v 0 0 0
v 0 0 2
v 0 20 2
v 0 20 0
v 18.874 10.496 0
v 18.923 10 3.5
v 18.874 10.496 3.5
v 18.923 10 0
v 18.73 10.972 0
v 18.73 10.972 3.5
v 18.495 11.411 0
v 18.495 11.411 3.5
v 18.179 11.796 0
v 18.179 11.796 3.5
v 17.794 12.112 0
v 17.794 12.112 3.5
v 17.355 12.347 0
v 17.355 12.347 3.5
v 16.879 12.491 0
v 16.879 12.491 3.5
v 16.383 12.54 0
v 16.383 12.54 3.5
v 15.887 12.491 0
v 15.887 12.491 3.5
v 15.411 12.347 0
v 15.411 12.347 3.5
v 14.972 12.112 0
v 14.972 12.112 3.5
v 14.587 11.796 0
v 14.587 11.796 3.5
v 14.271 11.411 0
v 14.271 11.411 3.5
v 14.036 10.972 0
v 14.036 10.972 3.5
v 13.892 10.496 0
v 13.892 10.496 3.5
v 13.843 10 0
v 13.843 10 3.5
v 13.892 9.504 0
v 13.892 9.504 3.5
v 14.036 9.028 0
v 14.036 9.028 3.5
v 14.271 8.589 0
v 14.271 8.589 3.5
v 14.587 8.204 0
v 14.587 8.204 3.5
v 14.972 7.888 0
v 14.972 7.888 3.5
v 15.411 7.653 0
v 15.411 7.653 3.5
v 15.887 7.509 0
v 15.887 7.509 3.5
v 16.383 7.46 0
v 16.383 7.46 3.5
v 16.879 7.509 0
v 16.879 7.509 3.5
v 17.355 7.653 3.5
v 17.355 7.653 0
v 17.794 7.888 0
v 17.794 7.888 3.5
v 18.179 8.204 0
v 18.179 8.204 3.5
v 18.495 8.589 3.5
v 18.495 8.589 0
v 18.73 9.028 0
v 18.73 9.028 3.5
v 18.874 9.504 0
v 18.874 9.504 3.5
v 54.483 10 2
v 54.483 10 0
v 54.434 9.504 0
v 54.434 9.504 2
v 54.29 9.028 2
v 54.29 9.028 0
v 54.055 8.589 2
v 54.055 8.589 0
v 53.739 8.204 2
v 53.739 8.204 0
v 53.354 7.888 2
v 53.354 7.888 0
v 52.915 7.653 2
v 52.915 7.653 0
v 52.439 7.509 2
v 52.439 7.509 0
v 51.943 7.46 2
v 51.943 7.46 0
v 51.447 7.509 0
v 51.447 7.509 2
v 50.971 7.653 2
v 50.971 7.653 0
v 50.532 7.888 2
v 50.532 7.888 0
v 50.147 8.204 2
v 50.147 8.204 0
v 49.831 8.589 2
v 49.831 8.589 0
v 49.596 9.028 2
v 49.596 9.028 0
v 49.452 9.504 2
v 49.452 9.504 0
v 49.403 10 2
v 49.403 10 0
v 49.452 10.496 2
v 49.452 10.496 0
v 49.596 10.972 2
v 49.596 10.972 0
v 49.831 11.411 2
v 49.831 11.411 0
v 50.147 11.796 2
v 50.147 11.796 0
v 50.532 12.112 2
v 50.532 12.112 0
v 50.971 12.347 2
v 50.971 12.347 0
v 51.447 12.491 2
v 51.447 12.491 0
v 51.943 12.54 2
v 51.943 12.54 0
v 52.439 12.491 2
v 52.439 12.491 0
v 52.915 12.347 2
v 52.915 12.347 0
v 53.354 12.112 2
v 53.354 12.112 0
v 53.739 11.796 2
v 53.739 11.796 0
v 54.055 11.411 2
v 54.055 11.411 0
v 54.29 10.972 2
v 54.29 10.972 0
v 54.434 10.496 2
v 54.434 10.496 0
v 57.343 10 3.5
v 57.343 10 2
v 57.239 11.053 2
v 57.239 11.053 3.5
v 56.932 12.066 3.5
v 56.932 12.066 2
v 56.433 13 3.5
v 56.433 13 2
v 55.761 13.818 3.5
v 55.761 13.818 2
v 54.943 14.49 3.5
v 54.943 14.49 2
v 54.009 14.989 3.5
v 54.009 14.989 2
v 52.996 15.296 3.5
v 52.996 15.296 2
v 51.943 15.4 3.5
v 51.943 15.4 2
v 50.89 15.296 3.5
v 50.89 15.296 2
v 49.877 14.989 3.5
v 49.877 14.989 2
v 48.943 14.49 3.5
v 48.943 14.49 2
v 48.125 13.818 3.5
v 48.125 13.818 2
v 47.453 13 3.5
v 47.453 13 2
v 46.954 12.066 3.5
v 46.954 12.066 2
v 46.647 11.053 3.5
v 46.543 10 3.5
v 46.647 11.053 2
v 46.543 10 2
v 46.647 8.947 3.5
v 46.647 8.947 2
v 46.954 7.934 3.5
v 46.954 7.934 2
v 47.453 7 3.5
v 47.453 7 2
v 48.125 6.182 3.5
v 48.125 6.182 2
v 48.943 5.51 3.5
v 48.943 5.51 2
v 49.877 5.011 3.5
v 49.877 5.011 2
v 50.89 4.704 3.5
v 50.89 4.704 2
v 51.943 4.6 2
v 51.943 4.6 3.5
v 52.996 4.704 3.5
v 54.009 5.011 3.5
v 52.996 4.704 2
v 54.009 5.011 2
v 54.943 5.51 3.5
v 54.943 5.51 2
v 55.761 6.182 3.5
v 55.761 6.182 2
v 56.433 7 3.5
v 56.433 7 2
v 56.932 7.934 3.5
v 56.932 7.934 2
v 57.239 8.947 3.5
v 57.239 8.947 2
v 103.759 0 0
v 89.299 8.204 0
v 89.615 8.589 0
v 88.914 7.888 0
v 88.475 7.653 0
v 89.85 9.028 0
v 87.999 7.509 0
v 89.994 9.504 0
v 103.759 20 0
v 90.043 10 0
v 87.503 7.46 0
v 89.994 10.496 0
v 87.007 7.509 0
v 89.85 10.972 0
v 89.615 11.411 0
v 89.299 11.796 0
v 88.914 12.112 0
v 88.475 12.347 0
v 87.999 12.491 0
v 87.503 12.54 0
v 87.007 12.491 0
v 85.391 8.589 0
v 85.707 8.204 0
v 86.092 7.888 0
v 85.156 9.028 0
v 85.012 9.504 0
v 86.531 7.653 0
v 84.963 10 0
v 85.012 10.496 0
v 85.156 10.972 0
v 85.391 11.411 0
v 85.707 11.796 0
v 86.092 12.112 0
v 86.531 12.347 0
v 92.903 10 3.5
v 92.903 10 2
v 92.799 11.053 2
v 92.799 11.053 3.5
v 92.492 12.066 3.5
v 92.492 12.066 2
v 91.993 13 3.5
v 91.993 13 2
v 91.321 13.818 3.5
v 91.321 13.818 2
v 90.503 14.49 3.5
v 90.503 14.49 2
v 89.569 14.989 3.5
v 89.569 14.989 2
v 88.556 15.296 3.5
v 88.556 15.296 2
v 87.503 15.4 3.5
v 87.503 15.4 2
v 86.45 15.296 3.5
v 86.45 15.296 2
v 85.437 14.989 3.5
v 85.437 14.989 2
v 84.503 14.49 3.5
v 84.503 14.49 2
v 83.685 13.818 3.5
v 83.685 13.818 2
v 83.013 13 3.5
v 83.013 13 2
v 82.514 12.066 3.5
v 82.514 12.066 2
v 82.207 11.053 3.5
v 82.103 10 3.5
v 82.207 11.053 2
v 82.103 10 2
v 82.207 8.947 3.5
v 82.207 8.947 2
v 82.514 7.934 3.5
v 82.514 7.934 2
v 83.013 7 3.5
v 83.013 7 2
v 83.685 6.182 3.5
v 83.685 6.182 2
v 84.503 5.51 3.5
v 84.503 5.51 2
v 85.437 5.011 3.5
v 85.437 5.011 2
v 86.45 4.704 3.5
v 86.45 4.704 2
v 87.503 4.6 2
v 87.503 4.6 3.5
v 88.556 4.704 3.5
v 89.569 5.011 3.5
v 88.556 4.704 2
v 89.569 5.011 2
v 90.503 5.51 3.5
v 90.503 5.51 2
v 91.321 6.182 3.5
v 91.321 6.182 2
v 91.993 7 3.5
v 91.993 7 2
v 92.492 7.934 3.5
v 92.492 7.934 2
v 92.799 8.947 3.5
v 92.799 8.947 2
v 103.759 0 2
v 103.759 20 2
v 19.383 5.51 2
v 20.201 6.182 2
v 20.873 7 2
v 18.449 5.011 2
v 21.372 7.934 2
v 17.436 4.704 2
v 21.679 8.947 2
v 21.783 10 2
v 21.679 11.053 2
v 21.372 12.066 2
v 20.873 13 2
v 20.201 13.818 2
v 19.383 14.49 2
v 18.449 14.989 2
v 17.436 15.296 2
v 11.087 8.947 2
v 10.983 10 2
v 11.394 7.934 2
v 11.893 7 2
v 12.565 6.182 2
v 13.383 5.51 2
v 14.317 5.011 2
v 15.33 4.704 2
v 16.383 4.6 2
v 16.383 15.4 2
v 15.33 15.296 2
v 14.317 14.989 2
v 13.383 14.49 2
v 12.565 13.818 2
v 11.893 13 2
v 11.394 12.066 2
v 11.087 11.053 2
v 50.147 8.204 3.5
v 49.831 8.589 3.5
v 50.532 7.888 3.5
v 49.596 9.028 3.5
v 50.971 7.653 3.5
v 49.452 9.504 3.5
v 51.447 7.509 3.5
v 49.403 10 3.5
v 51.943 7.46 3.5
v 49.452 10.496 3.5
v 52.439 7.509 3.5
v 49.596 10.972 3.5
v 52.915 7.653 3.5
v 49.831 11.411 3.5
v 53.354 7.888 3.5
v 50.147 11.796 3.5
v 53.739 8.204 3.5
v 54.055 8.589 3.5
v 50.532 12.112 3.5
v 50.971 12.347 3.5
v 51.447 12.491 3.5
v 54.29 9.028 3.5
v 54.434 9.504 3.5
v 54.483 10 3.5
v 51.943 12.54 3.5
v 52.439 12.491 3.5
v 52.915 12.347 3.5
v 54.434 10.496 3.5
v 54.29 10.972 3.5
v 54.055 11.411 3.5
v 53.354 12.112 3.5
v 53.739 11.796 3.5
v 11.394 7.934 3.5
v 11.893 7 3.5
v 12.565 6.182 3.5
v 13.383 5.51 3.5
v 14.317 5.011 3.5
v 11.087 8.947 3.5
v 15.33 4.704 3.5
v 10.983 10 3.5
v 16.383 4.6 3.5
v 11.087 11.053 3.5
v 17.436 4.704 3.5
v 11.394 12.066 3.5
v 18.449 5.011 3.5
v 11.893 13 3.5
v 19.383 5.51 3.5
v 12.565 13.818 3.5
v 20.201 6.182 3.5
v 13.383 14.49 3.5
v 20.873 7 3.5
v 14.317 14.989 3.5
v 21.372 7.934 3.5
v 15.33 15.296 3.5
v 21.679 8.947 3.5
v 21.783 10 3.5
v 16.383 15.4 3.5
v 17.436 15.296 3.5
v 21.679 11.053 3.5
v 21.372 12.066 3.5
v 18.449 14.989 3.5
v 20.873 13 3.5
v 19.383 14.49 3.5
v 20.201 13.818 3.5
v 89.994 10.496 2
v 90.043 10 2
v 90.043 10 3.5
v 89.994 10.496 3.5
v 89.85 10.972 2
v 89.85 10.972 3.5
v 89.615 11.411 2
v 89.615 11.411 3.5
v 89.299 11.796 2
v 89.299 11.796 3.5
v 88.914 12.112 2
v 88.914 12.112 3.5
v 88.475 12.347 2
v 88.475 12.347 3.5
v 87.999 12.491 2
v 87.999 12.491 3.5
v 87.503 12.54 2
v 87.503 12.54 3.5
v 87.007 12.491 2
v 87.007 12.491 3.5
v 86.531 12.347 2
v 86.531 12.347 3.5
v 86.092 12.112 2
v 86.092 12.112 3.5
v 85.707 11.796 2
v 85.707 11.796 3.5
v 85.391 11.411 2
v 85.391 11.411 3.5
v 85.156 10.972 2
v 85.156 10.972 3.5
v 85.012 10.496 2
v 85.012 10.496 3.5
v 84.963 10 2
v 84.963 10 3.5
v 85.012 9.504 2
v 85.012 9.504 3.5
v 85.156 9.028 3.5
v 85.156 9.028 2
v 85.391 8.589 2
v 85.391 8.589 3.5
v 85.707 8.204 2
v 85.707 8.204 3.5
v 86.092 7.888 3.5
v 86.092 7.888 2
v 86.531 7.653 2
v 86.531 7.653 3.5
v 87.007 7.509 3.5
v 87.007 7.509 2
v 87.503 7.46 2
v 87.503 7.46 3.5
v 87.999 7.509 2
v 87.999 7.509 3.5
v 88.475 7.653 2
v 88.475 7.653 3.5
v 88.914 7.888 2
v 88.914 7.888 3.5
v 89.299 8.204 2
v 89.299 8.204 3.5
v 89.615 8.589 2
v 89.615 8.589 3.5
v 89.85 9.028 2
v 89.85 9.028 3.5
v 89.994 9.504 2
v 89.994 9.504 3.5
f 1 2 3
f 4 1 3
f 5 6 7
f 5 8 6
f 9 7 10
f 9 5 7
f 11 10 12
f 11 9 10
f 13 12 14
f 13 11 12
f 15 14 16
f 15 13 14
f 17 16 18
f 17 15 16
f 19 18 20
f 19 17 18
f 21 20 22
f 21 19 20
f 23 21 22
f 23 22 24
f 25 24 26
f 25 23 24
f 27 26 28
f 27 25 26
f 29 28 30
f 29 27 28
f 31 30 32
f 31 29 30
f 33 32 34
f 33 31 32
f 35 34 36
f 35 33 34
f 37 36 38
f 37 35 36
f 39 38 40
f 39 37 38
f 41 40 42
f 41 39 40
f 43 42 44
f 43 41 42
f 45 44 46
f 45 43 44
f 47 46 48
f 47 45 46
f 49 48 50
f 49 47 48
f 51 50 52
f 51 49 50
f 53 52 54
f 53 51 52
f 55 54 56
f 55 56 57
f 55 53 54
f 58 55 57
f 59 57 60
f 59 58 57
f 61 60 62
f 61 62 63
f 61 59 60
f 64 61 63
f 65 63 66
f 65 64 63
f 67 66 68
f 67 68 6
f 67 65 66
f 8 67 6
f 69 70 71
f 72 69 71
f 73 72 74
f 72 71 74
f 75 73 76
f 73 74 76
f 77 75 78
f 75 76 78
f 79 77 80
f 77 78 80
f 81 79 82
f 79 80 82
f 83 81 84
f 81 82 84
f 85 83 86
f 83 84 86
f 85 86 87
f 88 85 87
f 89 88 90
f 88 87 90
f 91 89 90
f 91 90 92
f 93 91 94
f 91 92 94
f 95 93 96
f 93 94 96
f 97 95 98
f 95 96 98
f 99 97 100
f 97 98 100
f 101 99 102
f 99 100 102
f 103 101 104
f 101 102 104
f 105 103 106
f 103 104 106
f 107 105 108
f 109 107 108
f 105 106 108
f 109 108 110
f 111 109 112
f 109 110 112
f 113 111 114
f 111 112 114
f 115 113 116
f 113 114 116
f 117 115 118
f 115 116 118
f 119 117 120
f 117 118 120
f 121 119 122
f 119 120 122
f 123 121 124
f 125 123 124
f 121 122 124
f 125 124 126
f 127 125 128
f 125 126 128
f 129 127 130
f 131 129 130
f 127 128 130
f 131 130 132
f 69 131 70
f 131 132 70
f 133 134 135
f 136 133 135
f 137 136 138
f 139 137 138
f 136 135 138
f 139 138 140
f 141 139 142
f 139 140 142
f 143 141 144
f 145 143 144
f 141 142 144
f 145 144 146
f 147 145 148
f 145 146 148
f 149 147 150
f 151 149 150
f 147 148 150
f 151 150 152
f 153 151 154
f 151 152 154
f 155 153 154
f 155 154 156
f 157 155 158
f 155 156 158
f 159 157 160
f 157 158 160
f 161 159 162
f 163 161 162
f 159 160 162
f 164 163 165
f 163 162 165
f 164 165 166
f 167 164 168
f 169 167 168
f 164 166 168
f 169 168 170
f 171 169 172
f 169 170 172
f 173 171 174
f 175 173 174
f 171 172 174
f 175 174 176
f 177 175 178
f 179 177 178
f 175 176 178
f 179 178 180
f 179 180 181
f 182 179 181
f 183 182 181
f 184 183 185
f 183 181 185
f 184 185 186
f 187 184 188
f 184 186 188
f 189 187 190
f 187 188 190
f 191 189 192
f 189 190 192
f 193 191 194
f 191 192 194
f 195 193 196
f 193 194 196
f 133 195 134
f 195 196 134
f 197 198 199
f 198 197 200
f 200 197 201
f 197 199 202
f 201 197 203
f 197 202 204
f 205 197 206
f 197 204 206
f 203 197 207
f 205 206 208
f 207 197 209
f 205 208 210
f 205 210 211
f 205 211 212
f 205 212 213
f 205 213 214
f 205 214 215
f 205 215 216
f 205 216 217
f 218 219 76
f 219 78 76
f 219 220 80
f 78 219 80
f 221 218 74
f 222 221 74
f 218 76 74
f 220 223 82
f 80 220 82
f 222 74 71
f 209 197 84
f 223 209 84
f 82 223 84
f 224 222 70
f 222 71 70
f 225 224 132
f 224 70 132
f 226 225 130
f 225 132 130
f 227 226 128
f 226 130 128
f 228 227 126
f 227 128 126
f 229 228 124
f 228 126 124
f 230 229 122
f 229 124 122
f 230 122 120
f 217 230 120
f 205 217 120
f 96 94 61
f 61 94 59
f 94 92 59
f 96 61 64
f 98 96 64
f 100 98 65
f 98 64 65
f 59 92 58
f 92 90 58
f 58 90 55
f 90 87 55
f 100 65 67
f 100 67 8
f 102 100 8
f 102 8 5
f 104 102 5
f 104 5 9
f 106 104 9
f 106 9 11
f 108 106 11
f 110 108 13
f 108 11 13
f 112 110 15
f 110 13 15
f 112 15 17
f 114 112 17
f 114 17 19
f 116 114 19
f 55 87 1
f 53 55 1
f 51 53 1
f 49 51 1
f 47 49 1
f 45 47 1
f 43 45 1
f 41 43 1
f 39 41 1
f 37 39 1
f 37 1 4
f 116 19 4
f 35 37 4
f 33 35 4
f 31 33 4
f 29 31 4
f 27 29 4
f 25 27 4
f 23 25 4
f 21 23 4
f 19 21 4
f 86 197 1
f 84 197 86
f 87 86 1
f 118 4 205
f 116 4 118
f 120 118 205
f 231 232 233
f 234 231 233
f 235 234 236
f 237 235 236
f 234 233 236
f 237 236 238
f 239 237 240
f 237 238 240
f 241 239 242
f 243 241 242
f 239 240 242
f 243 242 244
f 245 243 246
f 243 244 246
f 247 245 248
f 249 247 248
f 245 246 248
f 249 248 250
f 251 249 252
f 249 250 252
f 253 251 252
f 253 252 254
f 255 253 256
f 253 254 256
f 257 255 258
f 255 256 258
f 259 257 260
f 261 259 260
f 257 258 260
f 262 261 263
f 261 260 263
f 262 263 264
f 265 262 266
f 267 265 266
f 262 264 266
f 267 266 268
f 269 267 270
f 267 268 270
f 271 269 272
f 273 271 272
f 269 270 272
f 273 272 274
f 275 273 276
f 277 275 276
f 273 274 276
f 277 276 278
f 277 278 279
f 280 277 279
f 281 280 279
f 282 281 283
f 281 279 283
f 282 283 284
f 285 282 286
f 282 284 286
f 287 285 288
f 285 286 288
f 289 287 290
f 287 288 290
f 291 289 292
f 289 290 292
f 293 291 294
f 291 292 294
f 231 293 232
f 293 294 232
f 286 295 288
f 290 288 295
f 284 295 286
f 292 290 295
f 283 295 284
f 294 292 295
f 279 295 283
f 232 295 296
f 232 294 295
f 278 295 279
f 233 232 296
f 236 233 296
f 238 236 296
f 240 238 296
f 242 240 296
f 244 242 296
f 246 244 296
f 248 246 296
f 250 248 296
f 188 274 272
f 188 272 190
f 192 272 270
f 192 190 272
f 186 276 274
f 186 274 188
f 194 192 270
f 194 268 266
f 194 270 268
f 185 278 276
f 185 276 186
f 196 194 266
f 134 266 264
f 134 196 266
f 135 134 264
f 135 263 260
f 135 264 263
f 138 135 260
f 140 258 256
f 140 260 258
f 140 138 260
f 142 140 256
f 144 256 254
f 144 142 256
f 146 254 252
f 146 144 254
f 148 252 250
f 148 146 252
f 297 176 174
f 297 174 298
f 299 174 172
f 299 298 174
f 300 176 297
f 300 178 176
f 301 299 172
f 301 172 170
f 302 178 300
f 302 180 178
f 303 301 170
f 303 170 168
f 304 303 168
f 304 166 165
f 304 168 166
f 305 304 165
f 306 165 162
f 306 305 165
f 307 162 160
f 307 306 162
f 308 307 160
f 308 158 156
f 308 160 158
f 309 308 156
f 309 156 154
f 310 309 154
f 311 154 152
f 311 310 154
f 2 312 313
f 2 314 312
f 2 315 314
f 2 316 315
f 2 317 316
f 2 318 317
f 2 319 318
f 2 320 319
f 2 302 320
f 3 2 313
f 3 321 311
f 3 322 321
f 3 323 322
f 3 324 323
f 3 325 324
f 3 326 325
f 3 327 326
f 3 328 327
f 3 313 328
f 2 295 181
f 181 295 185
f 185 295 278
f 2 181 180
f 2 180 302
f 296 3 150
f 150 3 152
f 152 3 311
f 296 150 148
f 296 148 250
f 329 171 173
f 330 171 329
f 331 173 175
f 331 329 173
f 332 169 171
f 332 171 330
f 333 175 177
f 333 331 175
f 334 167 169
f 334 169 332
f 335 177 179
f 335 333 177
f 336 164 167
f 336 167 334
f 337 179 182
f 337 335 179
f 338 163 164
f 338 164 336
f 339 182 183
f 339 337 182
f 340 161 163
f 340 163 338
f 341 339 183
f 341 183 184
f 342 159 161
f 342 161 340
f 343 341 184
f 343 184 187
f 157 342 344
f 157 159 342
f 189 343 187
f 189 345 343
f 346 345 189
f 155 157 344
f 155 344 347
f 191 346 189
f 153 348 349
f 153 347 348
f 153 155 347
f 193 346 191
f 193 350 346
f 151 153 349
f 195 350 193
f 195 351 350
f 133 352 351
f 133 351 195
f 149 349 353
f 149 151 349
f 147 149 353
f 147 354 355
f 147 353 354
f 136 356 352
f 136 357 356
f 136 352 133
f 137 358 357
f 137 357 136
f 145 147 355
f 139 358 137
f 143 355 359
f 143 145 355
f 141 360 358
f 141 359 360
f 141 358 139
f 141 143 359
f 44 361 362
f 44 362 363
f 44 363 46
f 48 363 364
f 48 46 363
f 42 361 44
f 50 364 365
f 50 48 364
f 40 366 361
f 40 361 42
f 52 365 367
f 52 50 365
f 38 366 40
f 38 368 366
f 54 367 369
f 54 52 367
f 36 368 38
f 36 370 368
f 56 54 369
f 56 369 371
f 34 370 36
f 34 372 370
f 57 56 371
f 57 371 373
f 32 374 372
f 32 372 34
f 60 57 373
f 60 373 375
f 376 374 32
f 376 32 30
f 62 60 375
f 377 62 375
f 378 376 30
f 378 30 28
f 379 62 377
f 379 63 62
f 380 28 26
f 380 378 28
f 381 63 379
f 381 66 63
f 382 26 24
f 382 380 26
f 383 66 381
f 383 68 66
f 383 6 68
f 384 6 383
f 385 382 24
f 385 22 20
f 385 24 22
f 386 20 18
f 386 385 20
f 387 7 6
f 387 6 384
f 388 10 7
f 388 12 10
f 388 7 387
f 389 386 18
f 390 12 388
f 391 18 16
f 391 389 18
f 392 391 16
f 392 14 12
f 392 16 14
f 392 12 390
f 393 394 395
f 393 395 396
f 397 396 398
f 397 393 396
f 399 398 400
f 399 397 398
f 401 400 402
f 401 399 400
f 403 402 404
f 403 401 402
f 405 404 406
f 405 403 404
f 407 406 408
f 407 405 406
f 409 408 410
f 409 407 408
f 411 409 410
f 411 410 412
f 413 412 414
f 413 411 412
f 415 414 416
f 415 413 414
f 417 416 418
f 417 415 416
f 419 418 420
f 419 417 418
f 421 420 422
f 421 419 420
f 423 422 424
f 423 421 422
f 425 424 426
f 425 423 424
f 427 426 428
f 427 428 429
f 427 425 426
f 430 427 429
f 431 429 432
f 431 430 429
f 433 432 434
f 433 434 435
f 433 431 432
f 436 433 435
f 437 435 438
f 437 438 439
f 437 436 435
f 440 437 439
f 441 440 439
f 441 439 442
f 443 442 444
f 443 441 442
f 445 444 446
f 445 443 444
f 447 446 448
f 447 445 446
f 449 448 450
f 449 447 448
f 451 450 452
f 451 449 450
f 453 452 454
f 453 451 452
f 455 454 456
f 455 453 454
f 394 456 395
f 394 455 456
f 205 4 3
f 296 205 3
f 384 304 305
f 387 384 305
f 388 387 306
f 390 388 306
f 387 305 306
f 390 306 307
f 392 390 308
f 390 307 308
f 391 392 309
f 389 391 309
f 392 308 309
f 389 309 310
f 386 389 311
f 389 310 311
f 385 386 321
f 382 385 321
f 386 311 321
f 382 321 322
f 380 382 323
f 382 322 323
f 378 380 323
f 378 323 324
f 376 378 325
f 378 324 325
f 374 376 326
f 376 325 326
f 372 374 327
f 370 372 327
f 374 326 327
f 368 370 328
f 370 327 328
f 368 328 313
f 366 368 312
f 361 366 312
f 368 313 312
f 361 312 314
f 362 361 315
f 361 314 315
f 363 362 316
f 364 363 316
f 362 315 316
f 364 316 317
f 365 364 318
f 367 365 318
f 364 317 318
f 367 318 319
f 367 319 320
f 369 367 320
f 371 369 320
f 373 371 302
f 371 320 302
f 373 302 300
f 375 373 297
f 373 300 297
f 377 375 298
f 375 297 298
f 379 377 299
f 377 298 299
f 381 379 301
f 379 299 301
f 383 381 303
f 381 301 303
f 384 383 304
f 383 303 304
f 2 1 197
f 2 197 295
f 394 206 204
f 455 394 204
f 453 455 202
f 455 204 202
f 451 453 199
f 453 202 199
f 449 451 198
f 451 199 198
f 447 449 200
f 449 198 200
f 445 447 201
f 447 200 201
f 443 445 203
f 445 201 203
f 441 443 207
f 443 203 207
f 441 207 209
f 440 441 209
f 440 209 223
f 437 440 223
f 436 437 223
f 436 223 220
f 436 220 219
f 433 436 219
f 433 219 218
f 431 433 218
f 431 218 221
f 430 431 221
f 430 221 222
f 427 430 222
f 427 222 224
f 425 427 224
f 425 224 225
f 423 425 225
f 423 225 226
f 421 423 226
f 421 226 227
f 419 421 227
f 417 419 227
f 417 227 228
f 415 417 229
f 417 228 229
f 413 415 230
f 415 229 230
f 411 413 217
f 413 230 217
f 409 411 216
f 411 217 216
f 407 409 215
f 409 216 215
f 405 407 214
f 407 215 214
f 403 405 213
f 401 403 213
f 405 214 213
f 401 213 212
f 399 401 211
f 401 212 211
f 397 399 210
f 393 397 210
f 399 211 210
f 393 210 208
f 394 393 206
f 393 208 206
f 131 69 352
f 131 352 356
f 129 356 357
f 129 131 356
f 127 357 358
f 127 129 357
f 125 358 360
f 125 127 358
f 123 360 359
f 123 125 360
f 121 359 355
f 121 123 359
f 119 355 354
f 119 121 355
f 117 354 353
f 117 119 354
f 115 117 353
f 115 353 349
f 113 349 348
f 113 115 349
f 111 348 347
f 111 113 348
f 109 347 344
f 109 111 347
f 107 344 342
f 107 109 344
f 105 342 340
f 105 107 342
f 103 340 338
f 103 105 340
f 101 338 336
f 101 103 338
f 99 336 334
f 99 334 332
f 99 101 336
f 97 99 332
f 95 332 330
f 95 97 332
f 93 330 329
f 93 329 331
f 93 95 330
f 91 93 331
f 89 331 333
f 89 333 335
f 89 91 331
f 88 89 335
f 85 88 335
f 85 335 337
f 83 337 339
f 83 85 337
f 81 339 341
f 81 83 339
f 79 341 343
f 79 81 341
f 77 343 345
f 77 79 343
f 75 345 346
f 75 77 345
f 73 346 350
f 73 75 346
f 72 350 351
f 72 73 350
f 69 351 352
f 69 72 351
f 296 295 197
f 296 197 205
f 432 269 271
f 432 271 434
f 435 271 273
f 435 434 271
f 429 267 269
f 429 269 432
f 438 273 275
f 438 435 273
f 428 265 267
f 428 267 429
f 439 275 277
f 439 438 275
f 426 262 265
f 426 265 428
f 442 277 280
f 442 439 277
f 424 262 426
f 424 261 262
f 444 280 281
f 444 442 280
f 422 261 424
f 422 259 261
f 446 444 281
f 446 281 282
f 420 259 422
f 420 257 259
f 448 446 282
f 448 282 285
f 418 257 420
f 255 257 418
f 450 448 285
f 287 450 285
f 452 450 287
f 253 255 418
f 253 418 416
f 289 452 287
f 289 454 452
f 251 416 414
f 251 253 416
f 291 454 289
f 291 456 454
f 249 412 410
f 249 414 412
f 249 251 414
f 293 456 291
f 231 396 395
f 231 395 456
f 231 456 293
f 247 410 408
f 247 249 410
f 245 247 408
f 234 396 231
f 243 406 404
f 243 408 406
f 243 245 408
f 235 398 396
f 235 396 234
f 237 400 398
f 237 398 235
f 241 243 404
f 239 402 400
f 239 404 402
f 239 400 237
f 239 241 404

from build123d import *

# Parameters (mm, degrees)
F0_W     = 20
F0_H     = 2
F1_DEPTH = 103.759
F2_R     = 2.54
F3_DEPTH = 12.7
F4_R     = 5.4
F4_R_2   = 2.54
F5_DEPTH = 1.5


with BuildPart() as f1:
    # F0 (on Right) → F1 (new body)
    with BuildSketch(Plane.YZ):
        with Locations((10, 1)):
            Rectangle(F0_W, F0_H)
    extrude(amount=F1_DEPTH)

    # F2 (on face) → F3 (cut, symmetric)
    with BuildSketch(Plane(origin=(0, 0, 0), x_dir=(1, 0, 0), z_dir=(0, 0, -1))):
        with Locations((87.503, -10)):
            Circle(F2_R)
        with Locations((16.383, -10)):
            Circle(F2_R)
        with Locations((51.943, -10)):
            Circle(F2_R)
    extrude(amount=F3_DEPTH, both=True, mode=Mode.SUBTRACT)

    # F4 (on face) → F5 (join)
    with BuildSketch(Plane.XY.offset(2)):
        with Locations((16.383, 10)):
            Circle(F4_R)
        with Locations((16.383, 10)):
            Circle(F4_R_2, mode=Mode.SUBTRACT)
        with Locations((51.943, 10)):
            Circle(F4_R)
        with Locations((51.943, 10)):
            Circle(F4_R_2, mode=Mode.SUBTRACT)
        with Locations((87.503, 10)):
            Circle(F4_R)
        with Locations((87.503, 10)):
            Circle(F4_R_2, mode=Mode.SUBTRACT)
    extrude(amount=F5_DEPTH)


solid = f1.part
